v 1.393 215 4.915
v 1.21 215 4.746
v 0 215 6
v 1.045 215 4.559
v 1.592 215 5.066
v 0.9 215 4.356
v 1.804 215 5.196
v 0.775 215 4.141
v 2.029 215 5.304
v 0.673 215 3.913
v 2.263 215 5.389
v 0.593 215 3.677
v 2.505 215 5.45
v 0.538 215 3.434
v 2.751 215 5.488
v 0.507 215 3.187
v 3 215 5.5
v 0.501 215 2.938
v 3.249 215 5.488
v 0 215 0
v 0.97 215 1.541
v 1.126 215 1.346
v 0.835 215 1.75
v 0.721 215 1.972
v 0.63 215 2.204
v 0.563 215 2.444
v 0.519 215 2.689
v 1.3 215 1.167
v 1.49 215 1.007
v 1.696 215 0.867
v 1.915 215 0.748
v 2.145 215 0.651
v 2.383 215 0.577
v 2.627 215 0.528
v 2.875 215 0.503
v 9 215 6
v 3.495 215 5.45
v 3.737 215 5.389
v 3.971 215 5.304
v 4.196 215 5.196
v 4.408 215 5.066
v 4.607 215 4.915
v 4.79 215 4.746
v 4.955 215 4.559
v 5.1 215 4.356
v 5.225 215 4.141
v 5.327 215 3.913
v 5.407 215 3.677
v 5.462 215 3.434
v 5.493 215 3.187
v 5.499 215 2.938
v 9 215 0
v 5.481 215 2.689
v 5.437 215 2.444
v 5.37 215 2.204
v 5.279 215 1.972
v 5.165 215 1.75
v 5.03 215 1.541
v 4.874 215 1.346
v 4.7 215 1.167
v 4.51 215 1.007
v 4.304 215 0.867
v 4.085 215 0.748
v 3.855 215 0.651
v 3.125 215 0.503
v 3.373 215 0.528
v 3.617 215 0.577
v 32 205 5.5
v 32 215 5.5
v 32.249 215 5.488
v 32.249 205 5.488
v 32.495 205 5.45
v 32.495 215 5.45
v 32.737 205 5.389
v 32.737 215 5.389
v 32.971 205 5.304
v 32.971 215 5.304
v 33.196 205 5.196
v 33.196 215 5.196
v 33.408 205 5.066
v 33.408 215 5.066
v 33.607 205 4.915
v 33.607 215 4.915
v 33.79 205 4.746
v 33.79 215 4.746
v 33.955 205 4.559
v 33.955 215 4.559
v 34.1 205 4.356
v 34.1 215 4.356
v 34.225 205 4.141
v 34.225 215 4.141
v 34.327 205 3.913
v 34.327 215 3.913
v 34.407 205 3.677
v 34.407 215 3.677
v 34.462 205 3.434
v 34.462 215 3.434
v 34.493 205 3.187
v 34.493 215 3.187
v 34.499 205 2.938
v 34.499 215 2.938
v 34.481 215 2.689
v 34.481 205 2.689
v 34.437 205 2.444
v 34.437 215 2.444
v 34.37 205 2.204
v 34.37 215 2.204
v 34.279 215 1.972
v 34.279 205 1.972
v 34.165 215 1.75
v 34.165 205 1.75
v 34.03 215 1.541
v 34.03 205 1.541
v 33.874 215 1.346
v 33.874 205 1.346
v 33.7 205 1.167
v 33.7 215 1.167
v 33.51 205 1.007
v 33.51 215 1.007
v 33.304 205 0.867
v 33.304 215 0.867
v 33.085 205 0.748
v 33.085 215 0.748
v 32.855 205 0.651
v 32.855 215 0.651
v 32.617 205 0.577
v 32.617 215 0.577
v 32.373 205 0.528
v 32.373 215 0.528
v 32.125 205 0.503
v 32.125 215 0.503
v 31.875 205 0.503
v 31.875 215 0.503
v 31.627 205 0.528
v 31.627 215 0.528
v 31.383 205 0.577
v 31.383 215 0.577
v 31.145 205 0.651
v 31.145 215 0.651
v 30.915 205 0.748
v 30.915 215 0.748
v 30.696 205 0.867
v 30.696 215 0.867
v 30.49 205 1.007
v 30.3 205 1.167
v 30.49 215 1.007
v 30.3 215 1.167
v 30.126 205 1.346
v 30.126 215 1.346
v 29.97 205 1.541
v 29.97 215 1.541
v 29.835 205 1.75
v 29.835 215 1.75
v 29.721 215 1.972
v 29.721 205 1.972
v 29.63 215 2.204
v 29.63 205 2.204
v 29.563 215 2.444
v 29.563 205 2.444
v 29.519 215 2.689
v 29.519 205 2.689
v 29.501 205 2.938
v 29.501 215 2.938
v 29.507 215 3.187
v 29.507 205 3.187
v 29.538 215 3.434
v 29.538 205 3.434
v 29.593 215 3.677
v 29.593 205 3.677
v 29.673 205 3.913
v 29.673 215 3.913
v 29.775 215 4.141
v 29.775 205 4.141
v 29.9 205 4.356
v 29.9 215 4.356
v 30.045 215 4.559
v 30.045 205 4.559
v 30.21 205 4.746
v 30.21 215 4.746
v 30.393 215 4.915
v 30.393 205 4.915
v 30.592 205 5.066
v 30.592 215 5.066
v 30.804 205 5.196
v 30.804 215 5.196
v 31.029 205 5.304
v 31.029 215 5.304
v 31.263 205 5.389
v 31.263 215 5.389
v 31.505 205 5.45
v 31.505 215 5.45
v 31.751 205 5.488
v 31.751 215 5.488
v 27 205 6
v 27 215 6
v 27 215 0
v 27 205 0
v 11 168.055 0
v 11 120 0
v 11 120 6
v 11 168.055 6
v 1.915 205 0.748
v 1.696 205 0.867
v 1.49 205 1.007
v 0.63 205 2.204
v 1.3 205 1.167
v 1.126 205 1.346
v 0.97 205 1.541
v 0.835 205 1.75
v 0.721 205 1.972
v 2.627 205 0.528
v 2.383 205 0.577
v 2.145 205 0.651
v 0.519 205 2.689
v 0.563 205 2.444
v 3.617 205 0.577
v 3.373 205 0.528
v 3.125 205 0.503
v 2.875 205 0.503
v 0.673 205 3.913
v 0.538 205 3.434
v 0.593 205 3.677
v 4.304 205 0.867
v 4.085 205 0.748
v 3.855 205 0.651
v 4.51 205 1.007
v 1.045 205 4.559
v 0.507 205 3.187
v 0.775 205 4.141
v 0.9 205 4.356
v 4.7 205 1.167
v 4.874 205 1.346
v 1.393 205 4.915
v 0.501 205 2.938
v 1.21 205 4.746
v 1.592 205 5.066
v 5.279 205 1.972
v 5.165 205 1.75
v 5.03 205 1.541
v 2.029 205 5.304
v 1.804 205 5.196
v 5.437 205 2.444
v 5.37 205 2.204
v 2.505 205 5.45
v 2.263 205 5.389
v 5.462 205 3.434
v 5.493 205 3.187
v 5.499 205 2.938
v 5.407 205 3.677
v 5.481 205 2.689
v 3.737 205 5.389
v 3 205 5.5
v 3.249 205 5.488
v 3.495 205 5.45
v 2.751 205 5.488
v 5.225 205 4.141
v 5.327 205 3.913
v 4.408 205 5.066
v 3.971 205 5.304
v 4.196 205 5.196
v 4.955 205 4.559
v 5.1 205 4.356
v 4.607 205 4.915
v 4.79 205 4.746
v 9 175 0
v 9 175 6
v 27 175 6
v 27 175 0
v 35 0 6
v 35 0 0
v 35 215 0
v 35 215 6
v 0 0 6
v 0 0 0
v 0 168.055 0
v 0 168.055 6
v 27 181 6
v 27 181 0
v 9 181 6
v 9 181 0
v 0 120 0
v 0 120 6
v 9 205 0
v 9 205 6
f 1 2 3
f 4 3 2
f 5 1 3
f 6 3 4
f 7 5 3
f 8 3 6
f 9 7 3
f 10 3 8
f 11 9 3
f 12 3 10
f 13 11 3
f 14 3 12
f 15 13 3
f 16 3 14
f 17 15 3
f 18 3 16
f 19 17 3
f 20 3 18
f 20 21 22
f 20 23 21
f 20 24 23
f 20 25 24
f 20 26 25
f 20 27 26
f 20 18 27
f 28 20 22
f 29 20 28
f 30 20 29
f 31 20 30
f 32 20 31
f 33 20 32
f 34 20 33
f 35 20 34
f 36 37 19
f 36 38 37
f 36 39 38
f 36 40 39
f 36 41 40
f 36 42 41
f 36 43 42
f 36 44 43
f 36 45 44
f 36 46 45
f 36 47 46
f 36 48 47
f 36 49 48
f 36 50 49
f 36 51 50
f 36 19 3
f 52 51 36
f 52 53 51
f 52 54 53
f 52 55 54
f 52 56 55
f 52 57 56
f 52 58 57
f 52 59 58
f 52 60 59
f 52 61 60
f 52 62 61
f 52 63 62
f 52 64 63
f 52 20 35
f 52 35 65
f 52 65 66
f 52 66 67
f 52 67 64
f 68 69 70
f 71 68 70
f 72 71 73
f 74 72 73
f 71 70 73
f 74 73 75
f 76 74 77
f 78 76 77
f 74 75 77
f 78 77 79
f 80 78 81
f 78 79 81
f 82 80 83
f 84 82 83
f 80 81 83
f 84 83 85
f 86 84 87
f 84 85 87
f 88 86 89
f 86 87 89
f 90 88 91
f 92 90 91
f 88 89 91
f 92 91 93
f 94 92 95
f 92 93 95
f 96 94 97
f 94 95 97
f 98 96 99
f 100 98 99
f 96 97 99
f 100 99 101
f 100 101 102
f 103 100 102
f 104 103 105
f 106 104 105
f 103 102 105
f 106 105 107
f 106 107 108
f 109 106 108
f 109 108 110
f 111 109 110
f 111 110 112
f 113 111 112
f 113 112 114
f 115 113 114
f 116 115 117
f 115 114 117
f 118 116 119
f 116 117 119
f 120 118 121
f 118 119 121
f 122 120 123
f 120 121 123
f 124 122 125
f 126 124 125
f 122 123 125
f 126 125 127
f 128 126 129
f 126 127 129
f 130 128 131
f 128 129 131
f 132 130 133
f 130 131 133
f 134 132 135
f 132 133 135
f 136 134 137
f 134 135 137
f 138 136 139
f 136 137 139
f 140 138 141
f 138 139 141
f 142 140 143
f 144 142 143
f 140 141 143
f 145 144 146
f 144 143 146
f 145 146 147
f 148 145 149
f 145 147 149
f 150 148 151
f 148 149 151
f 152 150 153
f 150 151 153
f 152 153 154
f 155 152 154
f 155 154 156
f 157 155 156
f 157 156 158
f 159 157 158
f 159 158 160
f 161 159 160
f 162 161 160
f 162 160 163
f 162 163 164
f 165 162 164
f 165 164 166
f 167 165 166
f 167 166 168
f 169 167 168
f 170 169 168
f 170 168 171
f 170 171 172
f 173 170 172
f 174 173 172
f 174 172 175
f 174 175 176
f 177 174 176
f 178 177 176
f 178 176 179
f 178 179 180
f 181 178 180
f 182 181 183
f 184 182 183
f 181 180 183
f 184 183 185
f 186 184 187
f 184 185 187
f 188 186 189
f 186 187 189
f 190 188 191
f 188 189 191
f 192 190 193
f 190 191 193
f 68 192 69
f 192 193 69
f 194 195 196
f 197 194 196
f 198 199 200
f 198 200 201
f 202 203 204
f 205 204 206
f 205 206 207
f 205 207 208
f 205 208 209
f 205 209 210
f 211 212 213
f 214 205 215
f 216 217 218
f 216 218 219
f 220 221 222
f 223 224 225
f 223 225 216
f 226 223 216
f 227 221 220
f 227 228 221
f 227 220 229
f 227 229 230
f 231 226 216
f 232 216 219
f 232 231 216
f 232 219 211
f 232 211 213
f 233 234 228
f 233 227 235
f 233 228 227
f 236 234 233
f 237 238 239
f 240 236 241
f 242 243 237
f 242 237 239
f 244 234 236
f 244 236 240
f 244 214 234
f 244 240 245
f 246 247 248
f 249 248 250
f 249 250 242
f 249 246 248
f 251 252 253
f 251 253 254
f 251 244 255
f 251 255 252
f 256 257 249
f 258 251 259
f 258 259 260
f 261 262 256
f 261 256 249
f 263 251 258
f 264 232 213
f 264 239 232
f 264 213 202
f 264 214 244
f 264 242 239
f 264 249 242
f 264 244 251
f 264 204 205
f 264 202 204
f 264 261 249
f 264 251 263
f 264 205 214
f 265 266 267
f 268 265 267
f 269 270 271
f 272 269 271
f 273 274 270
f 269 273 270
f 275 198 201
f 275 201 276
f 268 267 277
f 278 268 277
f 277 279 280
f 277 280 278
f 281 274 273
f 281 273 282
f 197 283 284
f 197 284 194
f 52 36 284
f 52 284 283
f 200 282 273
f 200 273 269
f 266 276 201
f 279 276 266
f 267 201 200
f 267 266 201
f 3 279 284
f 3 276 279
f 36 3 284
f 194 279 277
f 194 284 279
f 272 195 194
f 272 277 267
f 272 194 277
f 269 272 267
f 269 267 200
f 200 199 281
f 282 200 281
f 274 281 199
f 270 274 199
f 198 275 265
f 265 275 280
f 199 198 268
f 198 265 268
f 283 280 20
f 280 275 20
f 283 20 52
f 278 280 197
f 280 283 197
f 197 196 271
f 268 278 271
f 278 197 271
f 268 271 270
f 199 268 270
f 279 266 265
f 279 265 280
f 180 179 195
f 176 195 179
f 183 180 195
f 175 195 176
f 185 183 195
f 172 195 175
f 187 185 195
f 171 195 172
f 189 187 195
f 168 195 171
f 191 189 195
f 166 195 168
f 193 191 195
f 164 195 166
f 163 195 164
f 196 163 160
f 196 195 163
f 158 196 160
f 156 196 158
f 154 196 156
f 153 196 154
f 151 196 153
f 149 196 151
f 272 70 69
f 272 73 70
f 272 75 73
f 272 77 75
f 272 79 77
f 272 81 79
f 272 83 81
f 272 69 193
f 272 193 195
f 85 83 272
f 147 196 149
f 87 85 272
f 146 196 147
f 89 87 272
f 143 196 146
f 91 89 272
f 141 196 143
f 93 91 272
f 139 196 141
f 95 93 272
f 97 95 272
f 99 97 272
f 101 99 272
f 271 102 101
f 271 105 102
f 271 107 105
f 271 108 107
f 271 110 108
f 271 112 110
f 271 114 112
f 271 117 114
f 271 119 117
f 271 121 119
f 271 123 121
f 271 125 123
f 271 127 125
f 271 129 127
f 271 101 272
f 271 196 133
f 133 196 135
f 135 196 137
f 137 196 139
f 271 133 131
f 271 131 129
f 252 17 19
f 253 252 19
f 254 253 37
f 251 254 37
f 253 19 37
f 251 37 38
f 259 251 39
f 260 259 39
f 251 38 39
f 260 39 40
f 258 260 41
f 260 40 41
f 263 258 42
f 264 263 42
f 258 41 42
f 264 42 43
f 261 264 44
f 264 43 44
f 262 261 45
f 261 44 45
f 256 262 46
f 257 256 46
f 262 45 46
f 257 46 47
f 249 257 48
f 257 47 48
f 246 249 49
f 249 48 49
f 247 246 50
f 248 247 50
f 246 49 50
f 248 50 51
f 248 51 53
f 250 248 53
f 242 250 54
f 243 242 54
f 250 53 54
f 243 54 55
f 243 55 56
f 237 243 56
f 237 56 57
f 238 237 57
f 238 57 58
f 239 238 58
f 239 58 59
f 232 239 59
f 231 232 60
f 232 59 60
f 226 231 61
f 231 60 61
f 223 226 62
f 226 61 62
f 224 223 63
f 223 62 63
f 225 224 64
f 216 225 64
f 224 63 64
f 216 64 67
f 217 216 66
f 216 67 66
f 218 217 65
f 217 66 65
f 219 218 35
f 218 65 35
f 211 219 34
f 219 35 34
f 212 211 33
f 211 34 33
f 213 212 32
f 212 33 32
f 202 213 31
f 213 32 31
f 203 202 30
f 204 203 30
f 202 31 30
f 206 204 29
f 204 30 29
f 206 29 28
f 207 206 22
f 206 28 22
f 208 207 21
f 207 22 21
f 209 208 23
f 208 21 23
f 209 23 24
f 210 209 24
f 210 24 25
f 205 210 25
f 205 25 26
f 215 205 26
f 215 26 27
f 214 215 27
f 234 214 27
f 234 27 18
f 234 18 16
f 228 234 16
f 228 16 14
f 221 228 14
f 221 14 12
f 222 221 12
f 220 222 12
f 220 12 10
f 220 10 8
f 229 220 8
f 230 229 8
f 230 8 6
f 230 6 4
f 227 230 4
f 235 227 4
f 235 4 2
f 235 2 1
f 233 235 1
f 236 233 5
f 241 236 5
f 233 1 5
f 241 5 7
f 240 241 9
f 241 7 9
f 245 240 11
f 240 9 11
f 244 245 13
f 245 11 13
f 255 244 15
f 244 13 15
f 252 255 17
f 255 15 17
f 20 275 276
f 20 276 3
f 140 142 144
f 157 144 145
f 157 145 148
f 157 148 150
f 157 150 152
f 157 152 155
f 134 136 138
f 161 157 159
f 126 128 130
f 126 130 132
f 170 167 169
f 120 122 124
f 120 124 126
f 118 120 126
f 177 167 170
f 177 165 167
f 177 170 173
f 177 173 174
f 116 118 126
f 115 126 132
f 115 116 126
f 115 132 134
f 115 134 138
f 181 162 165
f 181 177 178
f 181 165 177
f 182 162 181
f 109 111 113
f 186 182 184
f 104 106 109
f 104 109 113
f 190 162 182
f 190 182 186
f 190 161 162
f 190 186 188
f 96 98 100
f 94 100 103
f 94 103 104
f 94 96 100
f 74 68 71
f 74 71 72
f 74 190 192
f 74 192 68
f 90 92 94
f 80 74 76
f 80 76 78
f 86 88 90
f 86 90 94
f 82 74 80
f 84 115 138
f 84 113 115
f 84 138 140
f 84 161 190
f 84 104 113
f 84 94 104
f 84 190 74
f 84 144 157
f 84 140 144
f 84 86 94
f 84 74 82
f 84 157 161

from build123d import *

# Parameters (mm, degrees)
ESQUISSE1_W                = 35
ESQUISSE1_H                = 215
BOSS_EXTRU_1_DEPTH         = 6
ESQUISSE2_W                = 18
ESQUISSE2_H                = 6
ENL_V_MAT_EXTRU_1_DEPTH    = 10
ESQUISSE3_W                = 18
ESQUISSE3_H                = 6
ENL_V_MAT_EXTRU_2_DEPTH    = 218.912826607
ESQUISSE4_W                = 11
ESQUISSE4_H                = 48.05464589
ENL_V_MAT_EXTRU_3_DEPTH    = 218.912826607
ESQUISSE5_R                = 2.5
ENL_V_MAT_EXTRU_4_DEPTH    = 10
R_P_TITION_LIN_AIRE1_COUNT = 2
R_P_TITION_LIN_AIRE1_PITCH = 29


with BuildPart() as part:
    # Esquisse1 → Boss.-Extru.1 (new body)
    with BuildSketch(Plane.XY):
        with Locations((17.5, 107.5)):
            Rectangle(ESQUISSE1_W, ESQUISSE1_H)
    extrude(amount=BOSS_EXTRU_1_DEPTH)

    # Esquisse2 → Enlèv. mat.-Extru.1 (cut)
    with BuildSketch(Plane(origin=(0, 215, 0), x_dir=(1, 0, 0), z_dir=(0, 1, 0))):
        with Locations((18, -3)):
            Rectangle(ESQUISSE2_W, ESQUISSE2_H)
    extrude(amount=-ENL_V_MAT_EXTRU_1_DEPTH, mode=Mode.SUBTRACT)

    # Esquisse3 → Enlèv. mat.-Extru.2 (cut, through all)
    with BuildSketch(Plane.XY.offset(6)):
        with Locations((18, 178)):
            Rectangle(ESQUISSE3_W, ESQUISSE3_H)
    extrude(amount=-ENL_V_MAT_EXTRU_2_DEPTH, mode=Mode.SUBTRACT)

    # Esquisse4 → Enlèv. mat.-Extru.3 (cut, through all)
    with BuildSketch(Plane(origin=(0, 0, 0), x_dir=(-1, 0, 0), z_dir=(0, 0, -1))):
        with Locations((-5.5, 144.027326709)):
            Rectangle(ESQUISSE4_W, ESQUISSE4_H)
    extrude(amount=-ENL_V_MAT_EXTRU_3_DEPTH, mode=Mode.SUBTRACT)

    # Esquisse5 → Enlèv. mat.-Extru.4 (cut)
    with BuildSketch(Plane(origin=(0, 215, 0), x_dir=(1, 0, 0), z_dir=(0, 1, 0))):
        with Locations(Location((3, -3, 0), (0, 0, 270))):
            Circle(ESQUISSE5_R)
    enl_v_mat_extru_4 = extrude(amount=-ENL_V_MAT_EXTRU_4_DEPTH, mode=Mode.SUBTRACT)

    # Répétition linéaire1: Enlèv. mat.-Extru.4 ×2
    with Locations(*[(i * R_P_TITION_LIN_AIRE1_PITCH, 0, 0) for i in range(1, R_P_TITION_LIN_AIRE1_COUNT)]):
        add(enl_v_mat_extru_4, mode=Mode.SUBTRACT)


solid = part.part
